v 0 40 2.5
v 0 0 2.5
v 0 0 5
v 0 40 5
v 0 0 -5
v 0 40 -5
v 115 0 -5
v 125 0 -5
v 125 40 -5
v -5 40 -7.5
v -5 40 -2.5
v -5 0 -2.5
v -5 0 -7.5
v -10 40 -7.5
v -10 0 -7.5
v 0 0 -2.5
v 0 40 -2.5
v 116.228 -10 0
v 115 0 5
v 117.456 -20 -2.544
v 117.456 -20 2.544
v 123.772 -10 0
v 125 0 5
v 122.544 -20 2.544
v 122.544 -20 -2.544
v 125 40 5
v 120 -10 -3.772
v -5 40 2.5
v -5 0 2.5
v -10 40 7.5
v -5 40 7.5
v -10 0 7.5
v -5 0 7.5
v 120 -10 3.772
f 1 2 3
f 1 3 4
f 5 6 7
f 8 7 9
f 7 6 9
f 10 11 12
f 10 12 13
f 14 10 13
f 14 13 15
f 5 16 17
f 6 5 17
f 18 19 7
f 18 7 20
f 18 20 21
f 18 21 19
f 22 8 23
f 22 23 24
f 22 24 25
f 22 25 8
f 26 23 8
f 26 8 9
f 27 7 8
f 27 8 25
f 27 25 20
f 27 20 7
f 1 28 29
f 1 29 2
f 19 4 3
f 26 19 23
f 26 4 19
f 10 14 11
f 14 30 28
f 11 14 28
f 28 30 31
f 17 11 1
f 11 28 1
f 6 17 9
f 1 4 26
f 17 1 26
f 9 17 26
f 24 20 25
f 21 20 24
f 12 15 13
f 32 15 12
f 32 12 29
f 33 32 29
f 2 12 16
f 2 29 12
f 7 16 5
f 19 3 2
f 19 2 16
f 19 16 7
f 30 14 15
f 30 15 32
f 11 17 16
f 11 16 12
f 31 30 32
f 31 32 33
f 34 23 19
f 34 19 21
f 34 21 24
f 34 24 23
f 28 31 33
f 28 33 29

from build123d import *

# Parameters (mm, degrees)
BOSS_EXTRUDE1_DEPTH      = 40
SKETCH3_W                = 125
SKETCH3_H                = 40
BOSS_EXTRUDE2_DEPTH      = 5
BOSS_EXTRUDE2_DEPTH_BACK = 5
SKETCH4_W                = 10
SKETCH4_H                = 10
BOSS_EXTRUDE3_DEPTH      = 20
BOSS_EXTRUDE3_TAPER      = 7


with BuildPart() as part:
    # Sketch2 → Boss-Extrude1 (new body)
    with BuildSketch(Plane(origin=(0, 0, 0), x_dir=(1, 0, 0), z_dir=(0, 1, 0))):
        Polygon((-10, 7.5), (-10, -7.5), (-5, -7.5), (-5, -2.5), (0, -2.5), (0, 2.5), (-5, 2.5), (-5, 7.5), align=None)
    extrude(amount=BOSS_EXTRUDE1_DEPTH)

    # Sketch3 → Boss-Extrude2 (add, two sides)
    with BuildSketch(Plane.XY) as boss_extrude2_sk:
        with Locations((62.5, 20)):
            Rectangle(SKETCH3_W, SKETCH3_H)
    extrude(amount=BOSS_EXTRUDE2_DEPTH)
    extrude(boss_extrude2_sk.sketch, amount=-BOSS_EXTRUDE2_DEPTH_BACK)

    # Sketch4 → Boss-Extrude3 (add)
    with BuildSketch(Plane.XZ):
        with Locations((120, 0)):
            Rectangle(SKETCH4_W, SKETCH4_H)
    extrude(amount=BOSS_EXTRUDE3_DEPTH, taper=BOSS_EXTRUDE3_TAPER)


solid = part.part
